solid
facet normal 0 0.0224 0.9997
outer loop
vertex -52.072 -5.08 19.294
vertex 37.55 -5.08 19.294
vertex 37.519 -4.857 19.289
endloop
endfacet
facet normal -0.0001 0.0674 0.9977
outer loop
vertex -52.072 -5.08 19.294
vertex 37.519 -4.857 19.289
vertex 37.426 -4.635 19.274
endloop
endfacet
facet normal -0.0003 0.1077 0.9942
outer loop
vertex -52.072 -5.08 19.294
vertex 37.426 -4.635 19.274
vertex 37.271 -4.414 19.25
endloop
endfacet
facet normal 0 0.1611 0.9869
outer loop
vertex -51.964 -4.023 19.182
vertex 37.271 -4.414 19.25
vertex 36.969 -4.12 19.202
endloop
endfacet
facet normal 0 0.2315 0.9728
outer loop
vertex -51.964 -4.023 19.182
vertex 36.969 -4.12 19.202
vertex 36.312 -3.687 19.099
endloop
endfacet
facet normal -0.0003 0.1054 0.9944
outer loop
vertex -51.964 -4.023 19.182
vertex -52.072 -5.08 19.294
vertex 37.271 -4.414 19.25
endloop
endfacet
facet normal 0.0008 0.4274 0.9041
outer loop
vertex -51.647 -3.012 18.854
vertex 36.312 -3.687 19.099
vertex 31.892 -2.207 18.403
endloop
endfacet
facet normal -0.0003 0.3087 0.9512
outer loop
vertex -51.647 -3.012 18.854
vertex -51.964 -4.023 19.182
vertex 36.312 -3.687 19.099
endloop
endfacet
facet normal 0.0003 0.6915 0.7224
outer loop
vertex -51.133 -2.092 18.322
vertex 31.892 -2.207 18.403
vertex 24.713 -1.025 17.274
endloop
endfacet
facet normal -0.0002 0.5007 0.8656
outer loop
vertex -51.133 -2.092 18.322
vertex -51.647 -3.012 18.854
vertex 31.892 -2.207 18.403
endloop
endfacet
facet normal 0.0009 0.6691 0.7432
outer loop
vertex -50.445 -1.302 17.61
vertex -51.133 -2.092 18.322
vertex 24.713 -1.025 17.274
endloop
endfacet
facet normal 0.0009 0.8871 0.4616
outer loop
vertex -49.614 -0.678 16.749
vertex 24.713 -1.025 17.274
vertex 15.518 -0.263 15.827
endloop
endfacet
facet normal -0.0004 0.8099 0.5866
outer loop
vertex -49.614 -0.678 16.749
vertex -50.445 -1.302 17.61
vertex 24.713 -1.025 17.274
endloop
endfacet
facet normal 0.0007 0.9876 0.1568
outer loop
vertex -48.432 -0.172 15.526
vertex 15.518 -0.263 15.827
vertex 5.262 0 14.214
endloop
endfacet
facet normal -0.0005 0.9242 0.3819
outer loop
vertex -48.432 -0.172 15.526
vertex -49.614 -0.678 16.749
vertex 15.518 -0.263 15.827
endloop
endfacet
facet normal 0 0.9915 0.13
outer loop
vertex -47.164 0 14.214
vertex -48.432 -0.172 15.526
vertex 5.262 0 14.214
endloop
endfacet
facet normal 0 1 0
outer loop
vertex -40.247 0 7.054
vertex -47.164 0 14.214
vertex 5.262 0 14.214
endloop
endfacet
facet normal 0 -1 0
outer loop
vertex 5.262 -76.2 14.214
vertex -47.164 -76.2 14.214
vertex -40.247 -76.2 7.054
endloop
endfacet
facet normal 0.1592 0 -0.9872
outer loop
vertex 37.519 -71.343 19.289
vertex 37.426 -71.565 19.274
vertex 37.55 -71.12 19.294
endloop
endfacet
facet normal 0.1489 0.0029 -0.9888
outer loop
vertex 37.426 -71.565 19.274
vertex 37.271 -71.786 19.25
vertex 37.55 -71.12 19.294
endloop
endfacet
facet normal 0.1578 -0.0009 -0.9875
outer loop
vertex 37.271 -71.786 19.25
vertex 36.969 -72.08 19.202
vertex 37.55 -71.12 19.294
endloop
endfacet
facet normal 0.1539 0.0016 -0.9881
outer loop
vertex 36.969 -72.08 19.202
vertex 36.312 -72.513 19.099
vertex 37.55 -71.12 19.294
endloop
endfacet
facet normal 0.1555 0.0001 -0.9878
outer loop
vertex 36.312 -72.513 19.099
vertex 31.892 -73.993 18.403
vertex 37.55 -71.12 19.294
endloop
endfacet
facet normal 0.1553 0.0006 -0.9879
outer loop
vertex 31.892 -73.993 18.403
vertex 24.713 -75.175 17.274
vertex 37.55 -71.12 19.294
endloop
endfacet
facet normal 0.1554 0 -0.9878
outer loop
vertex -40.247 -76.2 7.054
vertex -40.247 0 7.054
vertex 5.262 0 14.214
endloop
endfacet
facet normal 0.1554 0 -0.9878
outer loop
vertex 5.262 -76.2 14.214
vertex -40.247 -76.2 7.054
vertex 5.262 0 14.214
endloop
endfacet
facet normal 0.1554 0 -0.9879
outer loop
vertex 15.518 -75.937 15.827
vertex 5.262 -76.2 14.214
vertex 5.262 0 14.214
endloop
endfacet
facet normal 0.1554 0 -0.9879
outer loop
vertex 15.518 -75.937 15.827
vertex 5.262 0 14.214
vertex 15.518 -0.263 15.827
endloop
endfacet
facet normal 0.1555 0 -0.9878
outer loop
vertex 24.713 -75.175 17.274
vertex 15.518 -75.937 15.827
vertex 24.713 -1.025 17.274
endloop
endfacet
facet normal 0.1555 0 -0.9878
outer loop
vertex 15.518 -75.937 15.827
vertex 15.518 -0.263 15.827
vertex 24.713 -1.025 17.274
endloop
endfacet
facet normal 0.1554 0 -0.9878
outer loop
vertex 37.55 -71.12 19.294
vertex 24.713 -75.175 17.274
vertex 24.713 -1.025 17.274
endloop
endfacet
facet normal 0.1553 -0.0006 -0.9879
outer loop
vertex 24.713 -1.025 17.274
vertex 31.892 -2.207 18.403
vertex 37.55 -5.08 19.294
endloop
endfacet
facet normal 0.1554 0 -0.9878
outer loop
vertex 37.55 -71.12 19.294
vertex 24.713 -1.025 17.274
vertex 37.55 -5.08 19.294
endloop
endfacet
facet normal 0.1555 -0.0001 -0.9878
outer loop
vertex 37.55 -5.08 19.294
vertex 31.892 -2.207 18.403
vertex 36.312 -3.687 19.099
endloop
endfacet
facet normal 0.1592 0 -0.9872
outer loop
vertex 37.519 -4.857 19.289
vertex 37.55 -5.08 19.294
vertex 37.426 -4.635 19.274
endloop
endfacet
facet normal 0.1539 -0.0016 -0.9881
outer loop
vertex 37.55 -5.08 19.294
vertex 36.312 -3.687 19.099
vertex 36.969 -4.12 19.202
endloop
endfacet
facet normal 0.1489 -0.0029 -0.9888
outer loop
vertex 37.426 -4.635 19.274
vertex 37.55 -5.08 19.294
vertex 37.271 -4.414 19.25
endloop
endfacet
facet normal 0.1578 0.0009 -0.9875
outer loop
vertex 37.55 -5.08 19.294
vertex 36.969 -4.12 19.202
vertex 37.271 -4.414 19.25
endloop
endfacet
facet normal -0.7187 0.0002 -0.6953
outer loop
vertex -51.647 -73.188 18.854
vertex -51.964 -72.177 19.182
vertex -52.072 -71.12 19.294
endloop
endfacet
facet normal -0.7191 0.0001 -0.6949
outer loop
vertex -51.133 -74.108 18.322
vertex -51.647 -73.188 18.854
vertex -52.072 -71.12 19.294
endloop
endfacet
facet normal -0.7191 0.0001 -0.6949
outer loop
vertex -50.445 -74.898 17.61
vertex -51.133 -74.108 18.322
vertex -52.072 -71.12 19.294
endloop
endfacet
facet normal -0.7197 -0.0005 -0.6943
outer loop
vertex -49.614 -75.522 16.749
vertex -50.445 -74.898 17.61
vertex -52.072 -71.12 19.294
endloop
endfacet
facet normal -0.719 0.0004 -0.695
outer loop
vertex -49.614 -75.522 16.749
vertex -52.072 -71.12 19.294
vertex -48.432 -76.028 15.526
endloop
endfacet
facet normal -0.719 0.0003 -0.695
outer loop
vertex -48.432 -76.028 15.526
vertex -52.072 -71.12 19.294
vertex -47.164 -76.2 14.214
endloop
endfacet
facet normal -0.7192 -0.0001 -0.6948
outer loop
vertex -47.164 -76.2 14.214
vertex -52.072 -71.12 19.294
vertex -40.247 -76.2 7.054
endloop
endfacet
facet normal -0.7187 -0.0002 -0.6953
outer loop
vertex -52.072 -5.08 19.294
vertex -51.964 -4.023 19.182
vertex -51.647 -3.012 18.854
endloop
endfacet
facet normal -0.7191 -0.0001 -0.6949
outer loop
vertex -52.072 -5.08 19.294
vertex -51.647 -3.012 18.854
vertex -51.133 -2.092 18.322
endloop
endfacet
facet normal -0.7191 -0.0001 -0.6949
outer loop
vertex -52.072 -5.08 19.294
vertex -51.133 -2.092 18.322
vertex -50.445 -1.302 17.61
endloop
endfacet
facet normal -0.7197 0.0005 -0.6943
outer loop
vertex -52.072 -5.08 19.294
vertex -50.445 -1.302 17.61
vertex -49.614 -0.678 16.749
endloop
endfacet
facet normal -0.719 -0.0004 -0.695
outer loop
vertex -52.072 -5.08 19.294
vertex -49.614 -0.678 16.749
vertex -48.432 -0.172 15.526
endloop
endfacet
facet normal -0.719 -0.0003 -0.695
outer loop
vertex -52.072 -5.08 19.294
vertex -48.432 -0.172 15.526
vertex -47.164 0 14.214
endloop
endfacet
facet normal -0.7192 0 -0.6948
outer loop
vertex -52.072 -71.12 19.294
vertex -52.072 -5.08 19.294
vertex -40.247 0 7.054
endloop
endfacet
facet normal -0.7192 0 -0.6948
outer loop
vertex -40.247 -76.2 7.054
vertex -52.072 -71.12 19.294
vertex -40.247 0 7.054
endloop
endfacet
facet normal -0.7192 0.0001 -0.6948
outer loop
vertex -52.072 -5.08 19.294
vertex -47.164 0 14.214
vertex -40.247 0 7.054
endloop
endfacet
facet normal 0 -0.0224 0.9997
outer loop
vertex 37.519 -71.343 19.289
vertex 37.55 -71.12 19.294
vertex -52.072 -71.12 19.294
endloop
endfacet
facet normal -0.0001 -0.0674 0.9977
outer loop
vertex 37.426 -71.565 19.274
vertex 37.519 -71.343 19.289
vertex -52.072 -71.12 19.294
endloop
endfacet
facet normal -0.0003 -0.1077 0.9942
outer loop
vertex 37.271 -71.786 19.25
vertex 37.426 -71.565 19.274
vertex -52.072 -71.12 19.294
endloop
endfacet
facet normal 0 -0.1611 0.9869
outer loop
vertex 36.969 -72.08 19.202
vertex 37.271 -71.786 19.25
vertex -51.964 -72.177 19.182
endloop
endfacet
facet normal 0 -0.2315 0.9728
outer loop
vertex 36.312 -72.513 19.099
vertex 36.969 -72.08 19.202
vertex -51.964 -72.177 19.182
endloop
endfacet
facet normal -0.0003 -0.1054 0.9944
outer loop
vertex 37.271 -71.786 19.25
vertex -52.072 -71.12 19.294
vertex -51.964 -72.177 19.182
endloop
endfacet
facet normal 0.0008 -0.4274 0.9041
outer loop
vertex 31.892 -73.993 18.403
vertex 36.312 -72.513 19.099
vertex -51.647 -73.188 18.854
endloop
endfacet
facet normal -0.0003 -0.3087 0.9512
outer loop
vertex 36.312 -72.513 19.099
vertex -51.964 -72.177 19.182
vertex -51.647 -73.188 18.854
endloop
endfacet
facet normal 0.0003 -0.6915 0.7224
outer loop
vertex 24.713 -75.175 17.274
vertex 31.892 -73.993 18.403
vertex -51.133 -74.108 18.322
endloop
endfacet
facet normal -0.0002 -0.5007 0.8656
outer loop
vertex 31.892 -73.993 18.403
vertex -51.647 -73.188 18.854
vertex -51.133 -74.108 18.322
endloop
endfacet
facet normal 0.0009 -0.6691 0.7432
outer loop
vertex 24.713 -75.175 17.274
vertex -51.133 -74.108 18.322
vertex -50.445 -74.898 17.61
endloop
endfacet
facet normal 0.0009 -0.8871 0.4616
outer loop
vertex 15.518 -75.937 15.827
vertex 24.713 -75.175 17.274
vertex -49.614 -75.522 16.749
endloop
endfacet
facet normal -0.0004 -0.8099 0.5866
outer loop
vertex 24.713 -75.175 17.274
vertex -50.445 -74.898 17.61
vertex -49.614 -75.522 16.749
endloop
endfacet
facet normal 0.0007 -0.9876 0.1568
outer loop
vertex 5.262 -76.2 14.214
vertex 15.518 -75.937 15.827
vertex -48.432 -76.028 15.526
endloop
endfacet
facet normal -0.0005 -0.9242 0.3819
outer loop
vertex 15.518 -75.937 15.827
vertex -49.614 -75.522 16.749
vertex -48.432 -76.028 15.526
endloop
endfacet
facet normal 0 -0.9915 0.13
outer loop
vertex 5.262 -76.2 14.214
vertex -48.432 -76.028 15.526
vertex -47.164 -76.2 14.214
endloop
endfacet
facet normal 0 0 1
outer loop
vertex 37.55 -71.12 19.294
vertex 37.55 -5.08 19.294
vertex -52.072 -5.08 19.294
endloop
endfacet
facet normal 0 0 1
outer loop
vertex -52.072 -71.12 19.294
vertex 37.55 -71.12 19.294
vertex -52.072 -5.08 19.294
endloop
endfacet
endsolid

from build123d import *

# Parameters (mm, degrees)
F1_DEPTH = 76.2
F2_R     = 5.08
F3_R     = 5.08


with BuildPart() as f1:
    # F0 (on Front) → F1 (new body)
    with BuildSketch(Plane.XZ):
        Polygon((-40.24671, 7.053584), (37.549719, 19.293554), (-52.071765, 19.293554), align=None)
    extrude(amount=F1_DEPTH)

    # F2
    f2_edges = [f1.edges().sort_by_distance(p)[0] for p in [
        (-7.261023, -76.2, 19.293554),
    ]]
    fillet(f2_edges, radius=F2_R)

    # F3
    f3_edges = [f1.edges().sort_by_distance(p)[0] for p in [
        (-7.261023, 0, 19.293554),
    ]]
    fillet(f3_edges, radius=F3_R)


solid = f1.part
